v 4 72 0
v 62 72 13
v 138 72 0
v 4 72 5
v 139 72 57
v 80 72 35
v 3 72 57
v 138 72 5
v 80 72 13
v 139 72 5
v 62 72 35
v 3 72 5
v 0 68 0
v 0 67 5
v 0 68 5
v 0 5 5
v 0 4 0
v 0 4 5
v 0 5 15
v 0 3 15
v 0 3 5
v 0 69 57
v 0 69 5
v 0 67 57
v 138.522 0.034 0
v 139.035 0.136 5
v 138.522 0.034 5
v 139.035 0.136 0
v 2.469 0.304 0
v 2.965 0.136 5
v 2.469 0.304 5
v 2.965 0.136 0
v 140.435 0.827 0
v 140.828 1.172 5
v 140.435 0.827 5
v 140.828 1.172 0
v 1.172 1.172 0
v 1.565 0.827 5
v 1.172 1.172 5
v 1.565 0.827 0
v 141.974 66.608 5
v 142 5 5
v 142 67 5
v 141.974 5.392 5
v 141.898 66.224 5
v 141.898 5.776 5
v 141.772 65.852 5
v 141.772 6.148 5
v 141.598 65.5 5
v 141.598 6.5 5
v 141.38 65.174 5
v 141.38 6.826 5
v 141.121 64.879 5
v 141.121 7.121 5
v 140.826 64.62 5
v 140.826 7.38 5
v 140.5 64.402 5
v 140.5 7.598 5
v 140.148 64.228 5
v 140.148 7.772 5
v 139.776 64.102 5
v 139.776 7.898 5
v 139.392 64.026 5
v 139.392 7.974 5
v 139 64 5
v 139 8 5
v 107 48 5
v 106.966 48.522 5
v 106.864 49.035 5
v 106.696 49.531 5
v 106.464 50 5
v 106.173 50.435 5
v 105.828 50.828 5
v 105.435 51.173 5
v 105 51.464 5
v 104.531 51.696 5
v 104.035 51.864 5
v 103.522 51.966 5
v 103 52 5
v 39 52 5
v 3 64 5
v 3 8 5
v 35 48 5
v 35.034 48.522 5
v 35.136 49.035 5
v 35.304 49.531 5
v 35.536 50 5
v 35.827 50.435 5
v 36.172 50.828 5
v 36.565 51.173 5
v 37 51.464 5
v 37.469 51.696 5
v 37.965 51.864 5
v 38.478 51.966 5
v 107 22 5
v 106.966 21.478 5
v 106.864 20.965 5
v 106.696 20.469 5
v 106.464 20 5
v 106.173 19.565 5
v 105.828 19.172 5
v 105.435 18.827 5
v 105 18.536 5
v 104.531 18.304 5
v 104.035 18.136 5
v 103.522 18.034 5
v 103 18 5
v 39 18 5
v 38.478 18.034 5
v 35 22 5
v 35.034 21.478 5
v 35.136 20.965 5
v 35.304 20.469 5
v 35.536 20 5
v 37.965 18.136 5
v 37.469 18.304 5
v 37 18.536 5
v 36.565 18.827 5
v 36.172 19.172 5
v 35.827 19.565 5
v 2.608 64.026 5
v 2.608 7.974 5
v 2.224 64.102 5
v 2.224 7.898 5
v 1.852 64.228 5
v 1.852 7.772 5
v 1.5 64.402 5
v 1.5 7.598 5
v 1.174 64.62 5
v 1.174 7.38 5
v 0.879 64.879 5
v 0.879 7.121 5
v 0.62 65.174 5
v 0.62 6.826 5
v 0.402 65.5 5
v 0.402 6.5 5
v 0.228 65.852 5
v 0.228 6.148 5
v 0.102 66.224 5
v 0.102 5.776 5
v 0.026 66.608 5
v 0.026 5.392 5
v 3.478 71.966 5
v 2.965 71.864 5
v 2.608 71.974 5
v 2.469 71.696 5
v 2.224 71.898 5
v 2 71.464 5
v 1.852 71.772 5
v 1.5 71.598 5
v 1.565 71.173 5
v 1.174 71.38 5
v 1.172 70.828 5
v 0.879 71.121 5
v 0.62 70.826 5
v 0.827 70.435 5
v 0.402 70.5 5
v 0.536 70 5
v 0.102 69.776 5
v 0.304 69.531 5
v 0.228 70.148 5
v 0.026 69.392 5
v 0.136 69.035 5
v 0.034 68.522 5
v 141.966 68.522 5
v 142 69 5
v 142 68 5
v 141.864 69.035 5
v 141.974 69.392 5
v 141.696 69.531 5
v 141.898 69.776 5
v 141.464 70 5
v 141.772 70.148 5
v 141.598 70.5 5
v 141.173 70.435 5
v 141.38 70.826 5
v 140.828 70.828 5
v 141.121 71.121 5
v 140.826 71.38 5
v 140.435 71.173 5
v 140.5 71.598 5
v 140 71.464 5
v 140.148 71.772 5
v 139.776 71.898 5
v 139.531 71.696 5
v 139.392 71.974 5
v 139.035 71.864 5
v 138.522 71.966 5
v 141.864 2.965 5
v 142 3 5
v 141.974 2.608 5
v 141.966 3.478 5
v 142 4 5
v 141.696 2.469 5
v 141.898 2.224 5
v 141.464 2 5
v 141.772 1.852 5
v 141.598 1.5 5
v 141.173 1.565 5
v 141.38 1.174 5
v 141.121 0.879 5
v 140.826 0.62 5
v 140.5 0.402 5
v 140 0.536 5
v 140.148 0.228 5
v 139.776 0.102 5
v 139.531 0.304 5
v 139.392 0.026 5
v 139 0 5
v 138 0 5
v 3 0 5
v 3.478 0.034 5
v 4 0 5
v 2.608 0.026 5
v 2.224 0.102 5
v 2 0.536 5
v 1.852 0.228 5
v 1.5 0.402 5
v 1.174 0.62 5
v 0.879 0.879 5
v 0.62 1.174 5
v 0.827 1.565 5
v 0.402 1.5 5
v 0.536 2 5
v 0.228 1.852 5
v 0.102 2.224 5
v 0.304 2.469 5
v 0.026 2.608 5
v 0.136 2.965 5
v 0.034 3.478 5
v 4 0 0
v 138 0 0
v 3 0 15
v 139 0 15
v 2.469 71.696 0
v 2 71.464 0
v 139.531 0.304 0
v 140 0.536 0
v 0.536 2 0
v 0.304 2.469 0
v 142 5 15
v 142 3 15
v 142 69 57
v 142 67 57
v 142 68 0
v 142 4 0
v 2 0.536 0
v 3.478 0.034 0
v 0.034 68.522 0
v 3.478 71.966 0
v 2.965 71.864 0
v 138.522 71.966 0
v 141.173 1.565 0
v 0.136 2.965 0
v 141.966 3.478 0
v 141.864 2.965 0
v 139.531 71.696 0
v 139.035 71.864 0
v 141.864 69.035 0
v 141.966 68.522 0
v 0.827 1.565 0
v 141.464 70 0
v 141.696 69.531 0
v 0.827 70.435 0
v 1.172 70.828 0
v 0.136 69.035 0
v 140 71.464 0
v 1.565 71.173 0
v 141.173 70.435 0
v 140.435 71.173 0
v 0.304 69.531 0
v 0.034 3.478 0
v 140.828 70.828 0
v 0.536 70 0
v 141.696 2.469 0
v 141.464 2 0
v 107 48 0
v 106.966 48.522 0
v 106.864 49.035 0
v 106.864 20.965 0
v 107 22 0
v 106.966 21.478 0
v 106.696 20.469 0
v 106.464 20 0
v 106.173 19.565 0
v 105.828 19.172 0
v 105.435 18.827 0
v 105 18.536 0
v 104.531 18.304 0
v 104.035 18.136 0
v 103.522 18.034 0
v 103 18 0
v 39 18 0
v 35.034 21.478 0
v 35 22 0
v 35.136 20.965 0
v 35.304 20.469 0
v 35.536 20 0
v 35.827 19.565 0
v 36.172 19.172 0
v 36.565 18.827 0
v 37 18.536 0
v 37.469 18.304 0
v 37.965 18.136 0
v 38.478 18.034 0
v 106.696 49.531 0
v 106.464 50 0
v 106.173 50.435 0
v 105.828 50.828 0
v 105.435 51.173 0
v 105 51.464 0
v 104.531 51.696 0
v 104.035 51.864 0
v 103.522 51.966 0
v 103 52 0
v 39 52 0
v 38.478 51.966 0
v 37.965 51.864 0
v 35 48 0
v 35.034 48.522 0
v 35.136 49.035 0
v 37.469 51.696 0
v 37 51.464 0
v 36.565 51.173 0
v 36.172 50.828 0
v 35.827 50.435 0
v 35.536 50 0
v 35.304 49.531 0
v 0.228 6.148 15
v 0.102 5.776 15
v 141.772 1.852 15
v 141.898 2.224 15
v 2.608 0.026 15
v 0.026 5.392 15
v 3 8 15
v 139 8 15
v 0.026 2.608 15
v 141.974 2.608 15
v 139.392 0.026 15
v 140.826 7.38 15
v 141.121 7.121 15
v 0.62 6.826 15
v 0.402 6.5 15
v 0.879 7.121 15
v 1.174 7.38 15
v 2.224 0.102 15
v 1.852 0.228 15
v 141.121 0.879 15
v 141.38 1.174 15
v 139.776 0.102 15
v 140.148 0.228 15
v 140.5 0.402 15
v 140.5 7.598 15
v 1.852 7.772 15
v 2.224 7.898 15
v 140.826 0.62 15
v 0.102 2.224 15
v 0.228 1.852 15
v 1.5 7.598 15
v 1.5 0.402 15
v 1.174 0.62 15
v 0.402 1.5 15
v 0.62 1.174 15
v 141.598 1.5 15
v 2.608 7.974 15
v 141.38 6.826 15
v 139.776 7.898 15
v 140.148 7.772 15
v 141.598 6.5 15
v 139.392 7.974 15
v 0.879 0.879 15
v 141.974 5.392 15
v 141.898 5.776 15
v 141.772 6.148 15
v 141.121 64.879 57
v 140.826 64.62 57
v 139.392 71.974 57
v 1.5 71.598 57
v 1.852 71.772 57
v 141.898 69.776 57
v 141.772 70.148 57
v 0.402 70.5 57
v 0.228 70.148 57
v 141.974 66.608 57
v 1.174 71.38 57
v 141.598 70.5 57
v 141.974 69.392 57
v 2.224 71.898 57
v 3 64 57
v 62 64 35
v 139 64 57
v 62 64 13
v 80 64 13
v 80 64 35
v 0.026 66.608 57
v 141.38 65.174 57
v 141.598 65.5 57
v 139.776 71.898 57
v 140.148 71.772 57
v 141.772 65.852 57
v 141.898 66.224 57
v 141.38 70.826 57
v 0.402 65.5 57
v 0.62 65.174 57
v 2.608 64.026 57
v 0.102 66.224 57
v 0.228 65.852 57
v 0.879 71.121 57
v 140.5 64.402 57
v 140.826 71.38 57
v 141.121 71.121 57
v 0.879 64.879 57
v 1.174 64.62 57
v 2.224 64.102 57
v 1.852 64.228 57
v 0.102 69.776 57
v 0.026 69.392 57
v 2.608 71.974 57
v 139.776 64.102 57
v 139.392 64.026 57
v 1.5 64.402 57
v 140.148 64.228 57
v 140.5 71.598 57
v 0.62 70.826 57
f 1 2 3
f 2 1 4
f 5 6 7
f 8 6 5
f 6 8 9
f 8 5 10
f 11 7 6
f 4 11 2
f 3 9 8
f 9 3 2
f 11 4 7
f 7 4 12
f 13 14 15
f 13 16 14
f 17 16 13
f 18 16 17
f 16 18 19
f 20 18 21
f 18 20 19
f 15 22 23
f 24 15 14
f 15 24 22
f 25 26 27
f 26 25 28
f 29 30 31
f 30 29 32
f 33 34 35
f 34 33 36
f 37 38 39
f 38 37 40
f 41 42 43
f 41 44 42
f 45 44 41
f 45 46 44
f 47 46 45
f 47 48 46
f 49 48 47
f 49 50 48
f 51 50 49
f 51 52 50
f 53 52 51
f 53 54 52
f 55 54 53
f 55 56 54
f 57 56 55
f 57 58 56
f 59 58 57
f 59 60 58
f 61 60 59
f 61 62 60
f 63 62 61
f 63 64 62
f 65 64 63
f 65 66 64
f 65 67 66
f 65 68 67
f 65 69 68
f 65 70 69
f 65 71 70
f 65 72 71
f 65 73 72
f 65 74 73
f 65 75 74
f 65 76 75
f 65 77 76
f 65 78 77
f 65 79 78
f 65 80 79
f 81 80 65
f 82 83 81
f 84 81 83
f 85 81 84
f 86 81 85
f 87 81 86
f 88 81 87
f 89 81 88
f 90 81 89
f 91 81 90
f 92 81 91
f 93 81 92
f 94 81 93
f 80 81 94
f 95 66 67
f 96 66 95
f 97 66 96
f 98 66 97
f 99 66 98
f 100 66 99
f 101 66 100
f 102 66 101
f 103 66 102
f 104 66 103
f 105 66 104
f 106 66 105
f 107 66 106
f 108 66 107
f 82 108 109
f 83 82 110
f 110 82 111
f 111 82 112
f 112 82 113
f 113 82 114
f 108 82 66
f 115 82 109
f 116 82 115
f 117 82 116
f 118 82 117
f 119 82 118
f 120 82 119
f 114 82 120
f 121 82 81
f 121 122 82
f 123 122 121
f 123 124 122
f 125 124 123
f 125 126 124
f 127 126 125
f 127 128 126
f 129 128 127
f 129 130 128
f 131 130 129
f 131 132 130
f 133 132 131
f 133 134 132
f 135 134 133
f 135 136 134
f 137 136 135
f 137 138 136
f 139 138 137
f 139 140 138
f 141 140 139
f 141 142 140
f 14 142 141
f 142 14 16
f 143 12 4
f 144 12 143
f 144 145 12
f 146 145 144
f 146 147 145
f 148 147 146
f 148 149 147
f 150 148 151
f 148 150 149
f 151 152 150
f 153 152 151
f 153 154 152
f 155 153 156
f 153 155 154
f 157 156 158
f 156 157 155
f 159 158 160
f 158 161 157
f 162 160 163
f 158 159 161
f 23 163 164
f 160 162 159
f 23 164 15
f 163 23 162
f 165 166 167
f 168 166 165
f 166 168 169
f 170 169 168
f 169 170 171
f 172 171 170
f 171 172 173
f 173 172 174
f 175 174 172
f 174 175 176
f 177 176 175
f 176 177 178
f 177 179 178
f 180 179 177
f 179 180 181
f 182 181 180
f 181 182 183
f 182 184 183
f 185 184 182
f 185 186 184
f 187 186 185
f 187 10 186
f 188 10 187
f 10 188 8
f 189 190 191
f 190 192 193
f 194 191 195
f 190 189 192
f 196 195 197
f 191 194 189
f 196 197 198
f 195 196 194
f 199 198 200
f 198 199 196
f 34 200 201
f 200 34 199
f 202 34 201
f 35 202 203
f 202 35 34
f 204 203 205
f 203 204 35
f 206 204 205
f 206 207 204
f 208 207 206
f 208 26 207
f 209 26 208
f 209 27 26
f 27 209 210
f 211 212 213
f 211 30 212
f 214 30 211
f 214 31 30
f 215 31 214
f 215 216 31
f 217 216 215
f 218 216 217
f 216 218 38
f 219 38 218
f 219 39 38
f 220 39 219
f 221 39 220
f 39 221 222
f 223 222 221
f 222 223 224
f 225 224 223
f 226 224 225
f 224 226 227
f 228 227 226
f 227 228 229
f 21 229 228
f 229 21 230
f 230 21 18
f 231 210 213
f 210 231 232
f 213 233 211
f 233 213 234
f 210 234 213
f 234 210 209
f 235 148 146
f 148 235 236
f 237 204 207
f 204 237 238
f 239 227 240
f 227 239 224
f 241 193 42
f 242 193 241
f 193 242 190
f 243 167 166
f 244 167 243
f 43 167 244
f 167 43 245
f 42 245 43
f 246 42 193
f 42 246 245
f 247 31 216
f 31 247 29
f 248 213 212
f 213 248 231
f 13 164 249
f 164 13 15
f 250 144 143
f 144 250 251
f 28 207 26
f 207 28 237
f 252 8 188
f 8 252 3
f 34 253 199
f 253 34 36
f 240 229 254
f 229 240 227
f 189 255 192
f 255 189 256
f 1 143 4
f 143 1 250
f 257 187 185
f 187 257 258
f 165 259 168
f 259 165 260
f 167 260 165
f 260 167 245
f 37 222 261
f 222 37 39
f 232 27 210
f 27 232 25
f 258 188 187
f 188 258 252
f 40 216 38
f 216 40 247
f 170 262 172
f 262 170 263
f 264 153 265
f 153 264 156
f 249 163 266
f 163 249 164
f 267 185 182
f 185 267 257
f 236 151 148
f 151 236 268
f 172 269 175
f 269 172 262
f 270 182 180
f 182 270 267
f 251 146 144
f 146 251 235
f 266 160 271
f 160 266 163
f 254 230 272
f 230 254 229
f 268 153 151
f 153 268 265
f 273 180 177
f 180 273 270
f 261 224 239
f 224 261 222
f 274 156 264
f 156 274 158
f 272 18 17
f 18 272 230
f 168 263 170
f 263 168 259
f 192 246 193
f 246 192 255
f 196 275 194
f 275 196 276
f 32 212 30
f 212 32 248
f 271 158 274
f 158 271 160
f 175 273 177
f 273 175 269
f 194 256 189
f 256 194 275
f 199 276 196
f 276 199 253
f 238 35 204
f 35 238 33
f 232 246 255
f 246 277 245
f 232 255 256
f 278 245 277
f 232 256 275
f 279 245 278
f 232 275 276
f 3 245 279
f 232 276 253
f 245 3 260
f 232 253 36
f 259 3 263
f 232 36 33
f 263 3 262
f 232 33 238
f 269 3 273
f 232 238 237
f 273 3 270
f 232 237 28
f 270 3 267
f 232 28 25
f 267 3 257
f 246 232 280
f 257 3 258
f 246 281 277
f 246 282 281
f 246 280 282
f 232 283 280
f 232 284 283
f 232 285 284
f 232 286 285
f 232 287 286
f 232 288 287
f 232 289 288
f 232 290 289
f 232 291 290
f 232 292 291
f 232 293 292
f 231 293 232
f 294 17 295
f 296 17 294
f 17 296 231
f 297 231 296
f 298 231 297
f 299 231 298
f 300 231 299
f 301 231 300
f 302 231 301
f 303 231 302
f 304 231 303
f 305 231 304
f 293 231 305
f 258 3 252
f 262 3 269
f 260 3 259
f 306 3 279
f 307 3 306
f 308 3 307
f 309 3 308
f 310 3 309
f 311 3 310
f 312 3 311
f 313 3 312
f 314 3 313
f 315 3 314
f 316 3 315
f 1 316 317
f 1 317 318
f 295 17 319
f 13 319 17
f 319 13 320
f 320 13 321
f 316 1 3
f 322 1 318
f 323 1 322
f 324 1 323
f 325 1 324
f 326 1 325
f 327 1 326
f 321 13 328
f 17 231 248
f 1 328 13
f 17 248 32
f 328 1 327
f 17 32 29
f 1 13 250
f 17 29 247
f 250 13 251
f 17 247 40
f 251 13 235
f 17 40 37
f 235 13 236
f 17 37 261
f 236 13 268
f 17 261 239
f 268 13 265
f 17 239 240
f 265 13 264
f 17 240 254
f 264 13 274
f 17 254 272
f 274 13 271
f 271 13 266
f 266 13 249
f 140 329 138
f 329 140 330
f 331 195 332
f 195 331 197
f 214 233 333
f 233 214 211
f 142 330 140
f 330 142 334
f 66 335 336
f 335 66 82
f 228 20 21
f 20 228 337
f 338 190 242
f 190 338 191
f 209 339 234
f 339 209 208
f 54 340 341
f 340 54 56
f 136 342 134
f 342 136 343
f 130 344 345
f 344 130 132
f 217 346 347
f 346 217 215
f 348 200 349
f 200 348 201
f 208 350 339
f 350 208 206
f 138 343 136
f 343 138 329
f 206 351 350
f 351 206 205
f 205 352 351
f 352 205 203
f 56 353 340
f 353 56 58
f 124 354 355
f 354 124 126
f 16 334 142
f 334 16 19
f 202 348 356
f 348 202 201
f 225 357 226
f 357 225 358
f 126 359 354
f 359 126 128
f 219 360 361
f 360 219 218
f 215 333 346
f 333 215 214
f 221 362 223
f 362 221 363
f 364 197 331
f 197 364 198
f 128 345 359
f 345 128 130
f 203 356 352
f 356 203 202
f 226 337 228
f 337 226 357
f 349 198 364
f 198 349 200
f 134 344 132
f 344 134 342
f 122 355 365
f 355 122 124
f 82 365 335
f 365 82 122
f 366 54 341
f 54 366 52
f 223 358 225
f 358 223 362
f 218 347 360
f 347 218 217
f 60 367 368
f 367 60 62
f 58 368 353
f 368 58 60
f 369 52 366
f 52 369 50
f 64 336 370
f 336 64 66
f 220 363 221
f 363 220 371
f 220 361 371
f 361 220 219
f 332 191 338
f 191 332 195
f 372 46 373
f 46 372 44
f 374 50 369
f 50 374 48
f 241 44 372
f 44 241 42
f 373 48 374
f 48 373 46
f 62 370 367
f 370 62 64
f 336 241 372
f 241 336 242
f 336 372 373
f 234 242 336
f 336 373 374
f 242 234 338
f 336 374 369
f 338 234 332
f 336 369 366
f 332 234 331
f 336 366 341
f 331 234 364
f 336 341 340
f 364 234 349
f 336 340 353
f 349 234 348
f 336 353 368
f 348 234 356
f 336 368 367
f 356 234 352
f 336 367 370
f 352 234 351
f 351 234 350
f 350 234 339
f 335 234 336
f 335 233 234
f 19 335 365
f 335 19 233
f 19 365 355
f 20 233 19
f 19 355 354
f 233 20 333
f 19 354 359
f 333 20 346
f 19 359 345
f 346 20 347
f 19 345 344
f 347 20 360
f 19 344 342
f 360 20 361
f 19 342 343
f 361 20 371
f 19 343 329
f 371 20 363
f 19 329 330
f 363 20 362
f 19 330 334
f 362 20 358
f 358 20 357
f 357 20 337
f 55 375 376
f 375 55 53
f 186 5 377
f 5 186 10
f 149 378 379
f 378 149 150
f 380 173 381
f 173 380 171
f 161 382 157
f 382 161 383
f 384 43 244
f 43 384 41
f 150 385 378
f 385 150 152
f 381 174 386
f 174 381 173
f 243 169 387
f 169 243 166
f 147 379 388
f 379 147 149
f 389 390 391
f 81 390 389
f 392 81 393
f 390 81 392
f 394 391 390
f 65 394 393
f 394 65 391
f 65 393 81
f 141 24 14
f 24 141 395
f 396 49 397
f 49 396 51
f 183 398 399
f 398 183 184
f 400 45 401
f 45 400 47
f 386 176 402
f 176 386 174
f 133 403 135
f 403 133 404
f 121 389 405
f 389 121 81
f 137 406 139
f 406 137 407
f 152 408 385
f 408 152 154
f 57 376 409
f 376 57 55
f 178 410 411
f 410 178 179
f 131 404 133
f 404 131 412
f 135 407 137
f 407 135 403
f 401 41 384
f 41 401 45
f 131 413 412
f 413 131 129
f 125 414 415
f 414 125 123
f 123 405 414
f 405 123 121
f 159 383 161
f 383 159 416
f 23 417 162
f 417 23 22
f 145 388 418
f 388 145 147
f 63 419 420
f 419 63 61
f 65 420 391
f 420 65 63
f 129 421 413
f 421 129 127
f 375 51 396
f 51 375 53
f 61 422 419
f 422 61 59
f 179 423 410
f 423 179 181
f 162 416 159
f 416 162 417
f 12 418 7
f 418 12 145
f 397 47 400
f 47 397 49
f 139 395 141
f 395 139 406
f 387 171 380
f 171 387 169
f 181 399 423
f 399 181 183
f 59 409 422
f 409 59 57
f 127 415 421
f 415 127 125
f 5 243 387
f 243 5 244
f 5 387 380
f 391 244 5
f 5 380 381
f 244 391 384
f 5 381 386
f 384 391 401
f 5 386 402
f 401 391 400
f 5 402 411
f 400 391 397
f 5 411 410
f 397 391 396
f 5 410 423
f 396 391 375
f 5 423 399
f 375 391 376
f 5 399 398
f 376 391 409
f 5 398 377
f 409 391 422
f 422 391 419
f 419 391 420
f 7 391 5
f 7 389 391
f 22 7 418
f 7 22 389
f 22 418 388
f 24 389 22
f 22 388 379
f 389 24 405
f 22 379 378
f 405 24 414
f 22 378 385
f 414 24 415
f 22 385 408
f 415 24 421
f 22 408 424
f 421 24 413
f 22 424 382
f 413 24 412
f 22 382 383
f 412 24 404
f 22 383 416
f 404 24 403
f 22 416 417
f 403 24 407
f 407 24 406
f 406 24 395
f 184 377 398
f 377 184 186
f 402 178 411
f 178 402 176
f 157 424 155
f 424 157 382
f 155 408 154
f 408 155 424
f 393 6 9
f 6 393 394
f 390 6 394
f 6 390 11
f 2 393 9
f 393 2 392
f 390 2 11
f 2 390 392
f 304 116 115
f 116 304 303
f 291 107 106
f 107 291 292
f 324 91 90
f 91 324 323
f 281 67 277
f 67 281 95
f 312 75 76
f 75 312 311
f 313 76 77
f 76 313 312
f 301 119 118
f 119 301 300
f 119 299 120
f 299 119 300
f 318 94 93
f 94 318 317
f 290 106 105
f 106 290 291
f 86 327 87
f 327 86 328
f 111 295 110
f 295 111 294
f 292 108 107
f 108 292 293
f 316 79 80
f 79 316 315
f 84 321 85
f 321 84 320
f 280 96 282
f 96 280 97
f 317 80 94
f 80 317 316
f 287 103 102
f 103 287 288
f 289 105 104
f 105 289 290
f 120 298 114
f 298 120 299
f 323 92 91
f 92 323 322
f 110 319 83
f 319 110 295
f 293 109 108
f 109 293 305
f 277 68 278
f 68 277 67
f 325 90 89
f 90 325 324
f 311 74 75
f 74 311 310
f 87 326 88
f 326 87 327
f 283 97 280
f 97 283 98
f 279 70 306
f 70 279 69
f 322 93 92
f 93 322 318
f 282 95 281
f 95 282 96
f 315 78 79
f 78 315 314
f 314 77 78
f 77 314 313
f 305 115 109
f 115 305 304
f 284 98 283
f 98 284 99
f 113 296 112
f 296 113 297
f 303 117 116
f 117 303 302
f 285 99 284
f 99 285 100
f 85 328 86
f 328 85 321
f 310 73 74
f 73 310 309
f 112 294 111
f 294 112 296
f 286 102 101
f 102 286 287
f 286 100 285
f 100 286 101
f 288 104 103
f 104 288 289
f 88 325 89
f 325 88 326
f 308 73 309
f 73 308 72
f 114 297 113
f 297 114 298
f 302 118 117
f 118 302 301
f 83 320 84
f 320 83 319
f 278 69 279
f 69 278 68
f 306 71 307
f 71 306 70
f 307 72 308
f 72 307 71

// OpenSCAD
// Universal desktop stand for Waveshare ESP32-S3-ePaper-3.97.
// This is a first-print stand, not a full enclosure.
// It avoids relying on exact screw hole positions: the board sits in a front lip
// and leans against a rear rail. Measure the real board before designing a full case.

part = "all"; // "all", "base", "rear_rail"

$fn = 48;

stand_width = 142;
stand_depth = 72;
base_thickness = 5;
front_lip_height = 10;
front_lip_depth = 8;
rear_rail_height = 52;
rear_rail_thickness = 8;
lean_angle = 72;
cable_slot_width = 18;
battery_clearance_width = 72;
battery_clearance_depth = 34;

module rounded_box(w, d, h, r) {
  hull() {
    translate([r, r, 0]) cylinder(h = h, r = r);
    translate([w - r, r, 0]) cylinder(h = h, r = r);
    translate([r, d - r, 0]) cylinder(h = h, r = r);
    translate([w - r, d - r, 0]) cylinder(h = h, r = r);
  }
}

module base() {
  difference() {
    union() {
      rounded_box(stand_width, stand_depth, base_thickness, 4);
      translate([0, 0, base_thickness])
        rounded_box(stand_width, front_lip_depth, front_lip_height, 3);
      translate([0, stand_depth - rear_rail_thickness, base_thickness])
        rounded_box(stand_width, rear_rail_thickness, rear_rail_height, 3);
    }

    // Type-C cable exit at the center rear.
    translate([(stand_width - cable_slot_width) / 2, stand_depth - rear_rail_thickness - 1, base_thickness + 8])
      cube([cable_slot_width, rear_rail_thickness + 2, 22]);

    // Lighten the base and leave room for a thin LiPo pouch.
    translate([(stand_width - battery_clearance_width) / 2, 18, -1])
      rounded_box(battery_clearance_width, battery_clearance_depth, base_thickness + 2, 4);
  }
}

module rear_rail() {
  rotate([lean_angle - 90, 0, 0])
    rounded_box(stand_width, rear_rail_thickness, rear_rail_height, 3);
}

if (part == "base") {
  base();
} else if (part == "rear_rail") {
  rear_rail();
} else {
  base();
}
